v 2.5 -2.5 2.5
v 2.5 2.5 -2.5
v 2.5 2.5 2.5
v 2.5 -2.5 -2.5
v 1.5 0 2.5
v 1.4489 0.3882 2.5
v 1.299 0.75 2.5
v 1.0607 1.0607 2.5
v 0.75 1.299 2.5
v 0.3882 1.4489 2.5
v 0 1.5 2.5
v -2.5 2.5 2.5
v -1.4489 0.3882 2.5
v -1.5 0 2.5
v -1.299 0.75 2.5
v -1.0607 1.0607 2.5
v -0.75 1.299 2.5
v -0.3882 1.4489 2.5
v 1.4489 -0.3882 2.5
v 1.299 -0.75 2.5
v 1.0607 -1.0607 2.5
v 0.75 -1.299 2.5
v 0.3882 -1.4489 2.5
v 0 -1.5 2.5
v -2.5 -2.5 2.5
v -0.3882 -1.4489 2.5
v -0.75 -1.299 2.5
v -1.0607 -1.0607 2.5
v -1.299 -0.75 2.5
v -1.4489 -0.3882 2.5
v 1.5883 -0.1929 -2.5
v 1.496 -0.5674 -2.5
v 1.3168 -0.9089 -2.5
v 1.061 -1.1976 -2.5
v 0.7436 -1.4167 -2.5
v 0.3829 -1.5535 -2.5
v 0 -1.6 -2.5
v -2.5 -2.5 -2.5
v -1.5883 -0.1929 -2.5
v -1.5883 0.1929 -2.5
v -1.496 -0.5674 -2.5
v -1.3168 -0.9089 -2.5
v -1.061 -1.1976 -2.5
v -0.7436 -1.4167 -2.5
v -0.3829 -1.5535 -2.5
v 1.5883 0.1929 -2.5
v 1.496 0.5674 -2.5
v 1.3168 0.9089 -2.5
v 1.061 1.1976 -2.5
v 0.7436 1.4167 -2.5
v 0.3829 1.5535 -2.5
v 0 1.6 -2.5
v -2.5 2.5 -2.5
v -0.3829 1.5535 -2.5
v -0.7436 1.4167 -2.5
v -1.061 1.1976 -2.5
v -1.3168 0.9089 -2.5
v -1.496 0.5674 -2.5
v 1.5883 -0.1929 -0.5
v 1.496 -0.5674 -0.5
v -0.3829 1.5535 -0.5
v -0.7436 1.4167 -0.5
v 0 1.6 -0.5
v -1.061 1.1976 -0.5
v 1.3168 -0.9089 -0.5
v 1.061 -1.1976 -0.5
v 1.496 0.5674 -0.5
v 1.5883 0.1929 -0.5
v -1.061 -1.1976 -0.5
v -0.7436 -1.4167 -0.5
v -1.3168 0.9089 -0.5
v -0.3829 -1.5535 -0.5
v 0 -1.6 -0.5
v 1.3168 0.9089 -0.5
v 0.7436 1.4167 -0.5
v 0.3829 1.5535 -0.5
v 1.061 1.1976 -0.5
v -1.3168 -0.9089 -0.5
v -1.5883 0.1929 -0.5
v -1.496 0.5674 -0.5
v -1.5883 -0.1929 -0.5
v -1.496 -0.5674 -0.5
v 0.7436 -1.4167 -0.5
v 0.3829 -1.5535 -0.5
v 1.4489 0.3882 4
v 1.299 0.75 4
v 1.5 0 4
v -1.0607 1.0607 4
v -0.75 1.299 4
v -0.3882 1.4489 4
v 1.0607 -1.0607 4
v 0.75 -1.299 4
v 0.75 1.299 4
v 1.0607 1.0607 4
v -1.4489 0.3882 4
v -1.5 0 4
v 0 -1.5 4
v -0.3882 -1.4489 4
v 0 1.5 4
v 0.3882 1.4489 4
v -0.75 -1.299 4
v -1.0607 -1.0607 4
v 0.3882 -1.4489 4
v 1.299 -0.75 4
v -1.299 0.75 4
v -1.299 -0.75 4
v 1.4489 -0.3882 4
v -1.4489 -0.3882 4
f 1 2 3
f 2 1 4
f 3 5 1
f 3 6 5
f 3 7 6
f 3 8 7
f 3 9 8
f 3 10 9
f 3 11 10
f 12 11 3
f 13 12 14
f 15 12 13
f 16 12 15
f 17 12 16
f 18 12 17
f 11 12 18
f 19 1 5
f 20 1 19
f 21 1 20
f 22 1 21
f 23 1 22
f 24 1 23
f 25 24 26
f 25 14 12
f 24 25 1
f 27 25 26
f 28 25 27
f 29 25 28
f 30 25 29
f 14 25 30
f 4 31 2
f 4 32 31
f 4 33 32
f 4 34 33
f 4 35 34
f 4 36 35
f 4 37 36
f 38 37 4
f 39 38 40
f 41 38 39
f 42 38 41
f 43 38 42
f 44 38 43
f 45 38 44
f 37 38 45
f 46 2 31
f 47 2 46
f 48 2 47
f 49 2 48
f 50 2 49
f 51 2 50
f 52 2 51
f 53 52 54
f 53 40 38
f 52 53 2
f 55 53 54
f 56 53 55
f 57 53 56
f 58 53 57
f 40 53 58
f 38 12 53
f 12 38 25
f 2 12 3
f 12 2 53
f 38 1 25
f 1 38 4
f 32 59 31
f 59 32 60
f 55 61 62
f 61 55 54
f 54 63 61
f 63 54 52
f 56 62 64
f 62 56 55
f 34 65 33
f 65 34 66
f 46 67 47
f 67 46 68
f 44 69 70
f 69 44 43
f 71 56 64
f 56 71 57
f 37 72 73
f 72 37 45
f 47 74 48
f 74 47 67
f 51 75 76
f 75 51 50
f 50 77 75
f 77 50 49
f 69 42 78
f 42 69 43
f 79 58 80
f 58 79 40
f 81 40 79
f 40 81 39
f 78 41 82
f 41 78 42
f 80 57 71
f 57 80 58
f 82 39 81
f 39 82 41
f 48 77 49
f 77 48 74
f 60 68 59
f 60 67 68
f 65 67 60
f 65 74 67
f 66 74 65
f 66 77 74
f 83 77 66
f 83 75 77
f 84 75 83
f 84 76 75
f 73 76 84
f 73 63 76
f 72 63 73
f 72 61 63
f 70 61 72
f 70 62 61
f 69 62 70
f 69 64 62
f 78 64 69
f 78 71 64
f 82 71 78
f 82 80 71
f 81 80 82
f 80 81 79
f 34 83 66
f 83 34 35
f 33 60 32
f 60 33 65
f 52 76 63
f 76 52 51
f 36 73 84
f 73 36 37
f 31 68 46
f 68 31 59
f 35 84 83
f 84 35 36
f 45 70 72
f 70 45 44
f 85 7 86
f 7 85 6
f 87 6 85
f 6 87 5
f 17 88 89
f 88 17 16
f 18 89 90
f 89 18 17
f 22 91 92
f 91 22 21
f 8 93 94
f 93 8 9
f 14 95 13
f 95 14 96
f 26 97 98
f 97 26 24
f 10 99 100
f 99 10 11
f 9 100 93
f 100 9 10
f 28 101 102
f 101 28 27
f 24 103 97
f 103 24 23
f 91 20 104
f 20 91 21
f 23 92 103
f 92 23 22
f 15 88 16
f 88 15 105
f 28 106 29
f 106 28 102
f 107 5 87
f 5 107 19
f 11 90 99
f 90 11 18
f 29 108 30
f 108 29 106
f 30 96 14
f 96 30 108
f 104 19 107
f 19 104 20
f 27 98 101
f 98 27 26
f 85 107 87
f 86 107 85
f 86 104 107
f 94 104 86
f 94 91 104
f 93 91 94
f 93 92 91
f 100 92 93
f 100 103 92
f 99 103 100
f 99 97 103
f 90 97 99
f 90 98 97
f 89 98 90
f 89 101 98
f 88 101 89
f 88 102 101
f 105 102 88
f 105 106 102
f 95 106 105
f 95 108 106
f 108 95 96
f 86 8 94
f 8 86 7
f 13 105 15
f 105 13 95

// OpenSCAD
$fa = 1;
$fs = 0.4;
difference() {
    cube([5,5,5],center=true);
    translate([0,0,-3])
        rotate([0,0,90])
            cylinder(2.5,1.6,1.6);
    };
translate([0,0,1.5])
    cylinder(2.5,1.5,1.5);
